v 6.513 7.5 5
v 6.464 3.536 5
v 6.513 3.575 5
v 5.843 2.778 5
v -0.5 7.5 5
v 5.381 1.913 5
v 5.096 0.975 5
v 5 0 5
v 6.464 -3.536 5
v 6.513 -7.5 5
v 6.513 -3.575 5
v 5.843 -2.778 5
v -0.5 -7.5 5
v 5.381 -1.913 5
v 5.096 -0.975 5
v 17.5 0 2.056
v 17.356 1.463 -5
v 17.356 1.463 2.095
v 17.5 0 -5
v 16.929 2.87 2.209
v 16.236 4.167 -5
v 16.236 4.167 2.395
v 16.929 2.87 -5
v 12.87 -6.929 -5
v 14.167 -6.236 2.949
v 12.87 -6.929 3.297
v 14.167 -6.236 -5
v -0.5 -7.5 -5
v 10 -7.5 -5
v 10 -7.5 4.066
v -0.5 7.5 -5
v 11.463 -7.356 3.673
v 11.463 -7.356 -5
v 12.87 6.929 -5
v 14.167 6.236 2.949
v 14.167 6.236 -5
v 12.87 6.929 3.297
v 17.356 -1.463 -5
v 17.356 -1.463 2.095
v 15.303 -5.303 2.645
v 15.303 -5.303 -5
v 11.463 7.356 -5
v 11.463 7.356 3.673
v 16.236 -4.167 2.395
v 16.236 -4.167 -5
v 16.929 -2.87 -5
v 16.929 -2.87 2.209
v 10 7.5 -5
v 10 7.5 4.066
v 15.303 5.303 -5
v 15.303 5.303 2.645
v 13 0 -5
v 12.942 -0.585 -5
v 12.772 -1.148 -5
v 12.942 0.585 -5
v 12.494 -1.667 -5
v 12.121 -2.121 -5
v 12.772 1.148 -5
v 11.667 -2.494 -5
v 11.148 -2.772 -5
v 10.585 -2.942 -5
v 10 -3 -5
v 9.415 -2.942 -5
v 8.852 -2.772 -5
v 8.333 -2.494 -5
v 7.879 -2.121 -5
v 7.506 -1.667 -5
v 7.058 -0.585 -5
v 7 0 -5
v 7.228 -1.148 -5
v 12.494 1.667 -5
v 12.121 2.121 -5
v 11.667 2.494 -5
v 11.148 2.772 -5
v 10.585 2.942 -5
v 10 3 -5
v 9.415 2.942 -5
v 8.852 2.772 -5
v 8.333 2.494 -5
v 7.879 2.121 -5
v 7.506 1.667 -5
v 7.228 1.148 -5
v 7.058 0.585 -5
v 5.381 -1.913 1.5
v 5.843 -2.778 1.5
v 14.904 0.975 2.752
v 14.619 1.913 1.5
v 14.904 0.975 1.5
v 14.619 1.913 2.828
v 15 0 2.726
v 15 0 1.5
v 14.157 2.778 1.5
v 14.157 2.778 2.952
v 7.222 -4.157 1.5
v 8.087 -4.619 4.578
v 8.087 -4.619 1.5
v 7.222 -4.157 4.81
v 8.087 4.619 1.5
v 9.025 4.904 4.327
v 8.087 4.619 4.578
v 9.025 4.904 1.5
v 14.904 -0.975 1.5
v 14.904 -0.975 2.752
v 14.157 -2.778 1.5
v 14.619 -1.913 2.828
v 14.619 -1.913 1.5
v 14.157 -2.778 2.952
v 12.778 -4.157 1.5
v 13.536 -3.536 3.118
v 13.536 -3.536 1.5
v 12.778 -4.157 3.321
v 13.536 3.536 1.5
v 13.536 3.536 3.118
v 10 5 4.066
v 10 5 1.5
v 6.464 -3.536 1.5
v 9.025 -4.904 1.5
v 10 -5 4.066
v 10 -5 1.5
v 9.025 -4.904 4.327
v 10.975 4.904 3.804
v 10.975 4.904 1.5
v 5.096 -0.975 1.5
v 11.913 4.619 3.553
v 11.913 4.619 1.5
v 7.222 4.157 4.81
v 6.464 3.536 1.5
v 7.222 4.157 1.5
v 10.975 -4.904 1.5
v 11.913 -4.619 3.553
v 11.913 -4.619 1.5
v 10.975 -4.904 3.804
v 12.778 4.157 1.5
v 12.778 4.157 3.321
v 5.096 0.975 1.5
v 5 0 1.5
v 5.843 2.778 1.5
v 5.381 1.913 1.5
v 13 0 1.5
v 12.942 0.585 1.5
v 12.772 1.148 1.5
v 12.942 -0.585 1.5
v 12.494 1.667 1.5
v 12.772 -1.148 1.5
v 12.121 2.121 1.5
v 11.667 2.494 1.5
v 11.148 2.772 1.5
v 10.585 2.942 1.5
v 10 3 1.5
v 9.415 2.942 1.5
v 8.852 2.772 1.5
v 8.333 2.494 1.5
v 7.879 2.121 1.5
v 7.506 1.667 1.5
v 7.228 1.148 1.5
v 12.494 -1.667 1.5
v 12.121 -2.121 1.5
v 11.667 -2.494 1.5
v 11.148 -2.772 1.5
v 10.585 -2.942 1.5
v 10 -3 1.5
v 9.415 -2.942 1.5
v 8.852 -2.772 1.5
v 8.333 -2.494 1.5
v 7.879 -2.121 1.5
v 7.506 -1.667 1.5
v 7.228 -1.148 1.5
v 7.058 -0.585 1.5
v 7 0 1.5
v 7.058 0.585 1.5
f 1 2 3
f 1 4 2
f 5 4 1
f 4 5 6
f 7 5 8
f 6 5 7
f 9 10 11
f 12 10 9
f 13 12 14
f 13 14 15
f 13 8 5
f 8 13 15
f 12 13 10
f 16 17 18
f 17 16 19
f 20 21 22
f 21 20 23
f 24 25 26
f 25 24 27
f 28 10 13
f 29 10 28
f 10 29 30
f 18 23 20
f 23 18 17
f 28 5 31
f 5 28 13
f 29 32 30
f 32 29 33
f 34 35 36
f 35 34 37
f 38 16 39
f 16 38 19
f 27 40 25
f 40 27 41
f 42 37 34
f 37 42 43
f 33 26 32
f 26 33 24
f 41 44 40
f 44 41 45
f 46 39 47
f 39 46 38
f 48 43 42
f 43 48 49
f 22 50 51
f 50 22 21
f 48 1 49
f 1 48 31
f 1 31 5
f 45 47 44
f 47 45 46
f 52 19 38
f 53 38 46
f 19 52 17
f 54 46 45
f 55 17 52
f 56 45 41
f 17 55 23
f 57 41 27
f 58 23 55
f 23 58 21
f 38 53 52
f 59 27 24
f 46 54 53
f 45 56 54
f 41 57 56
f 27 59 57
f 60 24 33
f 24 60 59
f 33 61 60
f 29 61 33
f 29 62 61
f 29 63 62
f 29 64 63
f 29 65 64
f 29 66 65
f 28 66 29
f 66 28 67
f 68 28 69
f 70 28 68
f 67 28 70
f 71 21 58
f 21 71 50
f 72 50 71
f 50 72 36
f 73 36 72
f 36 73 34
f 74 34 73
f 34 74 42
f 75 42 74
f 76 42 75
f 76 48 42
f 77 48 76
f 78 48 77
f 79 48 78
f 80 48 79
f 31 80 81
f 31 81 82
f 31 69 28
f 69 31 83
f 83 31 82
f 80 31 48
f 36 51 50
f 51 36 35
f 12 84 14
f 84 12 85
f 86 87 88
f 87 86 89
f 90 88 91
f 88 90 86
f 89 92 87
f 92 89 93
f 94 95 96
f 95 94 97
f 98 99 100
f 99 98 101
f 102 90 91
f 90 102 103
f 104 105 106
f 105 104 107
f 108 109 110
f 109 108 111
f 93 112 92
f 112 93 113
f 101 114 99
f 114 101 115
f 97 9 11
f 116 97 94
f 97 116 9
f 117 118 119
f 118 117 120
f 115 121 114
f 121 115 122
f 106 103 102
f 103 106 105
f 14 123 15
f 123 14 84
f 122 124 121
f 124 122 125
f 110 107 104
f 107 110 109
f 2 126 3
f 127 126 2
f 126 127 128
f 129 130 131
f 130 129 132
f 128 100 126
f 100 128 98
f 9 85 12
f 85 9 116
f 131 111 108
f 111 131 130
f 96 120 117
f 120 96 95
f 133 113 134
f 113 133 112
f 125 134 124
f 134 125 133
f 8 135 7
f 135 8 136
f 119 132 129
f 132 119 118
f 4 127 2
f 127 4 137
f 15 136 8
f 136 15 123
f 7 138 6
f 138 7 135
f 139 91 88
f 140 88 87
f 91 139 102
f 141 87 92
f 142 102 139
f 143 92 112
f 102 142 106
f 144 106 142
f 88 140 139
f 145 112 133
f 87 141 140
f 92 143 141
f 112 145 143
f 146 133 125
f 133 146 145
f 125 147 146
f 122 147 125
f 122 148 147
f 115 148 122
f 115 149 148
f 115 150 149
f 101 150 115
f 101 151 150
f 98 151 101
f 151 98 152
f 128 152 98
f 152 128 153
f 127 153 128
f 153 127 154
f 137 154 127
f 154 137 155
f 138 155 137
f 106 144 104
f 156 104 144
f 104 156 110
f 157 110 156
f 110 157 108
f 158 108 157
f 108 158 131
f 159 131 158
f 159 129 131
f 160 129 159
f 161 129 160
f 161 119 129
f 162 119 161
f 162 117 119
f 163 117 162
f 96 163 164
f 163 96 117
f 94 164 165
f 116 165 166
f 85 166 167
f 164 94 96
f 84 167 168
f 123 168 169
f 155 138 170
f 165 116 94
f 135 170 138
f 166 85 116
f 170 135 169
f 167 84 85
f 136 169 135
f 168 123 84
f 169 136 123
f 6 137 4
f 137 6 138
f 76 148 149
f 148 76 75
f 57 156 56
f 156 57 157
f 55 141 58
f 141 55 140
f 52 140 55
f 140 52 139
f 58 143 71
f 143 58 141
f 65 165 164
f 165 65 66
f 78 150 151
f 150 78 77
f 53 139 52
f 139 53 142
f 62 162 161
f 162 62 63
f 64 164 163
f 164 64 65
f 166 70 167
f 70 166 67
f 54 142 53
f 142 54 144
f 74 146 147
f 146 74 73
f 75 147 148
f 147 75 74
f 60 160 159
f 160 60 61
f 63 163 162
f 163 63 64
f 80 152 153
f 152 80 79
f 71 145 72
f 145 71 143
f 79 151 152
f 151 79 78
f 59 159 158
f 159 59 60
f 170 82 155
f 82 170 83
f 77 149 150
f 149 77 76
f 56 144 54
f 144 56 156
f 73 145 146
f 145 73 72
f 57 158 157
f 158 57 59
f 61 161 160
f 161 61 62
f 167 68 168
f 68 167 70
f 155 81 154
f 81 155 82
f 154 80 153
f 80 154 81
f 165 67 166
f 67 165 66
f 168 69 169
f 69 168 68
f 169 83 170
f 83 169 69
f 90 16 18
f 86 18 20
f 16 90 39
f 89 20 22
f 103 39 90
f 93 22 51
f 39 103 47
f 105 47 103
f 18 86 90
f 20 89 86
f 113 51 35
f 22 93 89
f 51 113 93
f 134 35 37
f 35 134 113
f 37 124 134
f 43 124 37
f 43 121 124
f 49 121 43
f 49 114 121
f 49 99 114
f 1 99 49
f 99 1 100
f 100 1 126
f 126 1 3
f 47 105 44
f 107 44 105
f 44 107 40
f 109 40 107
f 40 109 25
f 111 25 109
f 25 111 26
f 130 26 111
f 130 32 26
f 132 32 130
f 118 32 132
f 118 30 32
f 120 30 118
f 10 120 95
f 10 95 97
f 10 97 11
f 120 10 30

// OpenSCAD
thickness = 10;
hole_diameter = 6;  // Durchmesser der zusätzlichen Löcher

// Parameter für die Abschrägung
chamfer_height = 15; // Höhe der Abschrägung
chamfer_width = 35;  // Breite der Abschrägung

// Parameter für die Schraubenvertiefung
screw_diameter = 10; // Durchmesser der Schraube
screw_depth = 3.5;    // Tiefe der Vertiefung
hole_diameter = 6;  // Durchmesser der zusätzlichen Löcher

difference() {
        hull() {
            cube([1, 15, thickness], center=true);
            translate([10, 0, 0])
                cylinder(d=15, h=thickness, center=true, $fn=32);
        }
        
        // Vertiefung für die Schraube
        translate([10, 0, thickness/2 - screw_depth/2])
            cylinder(d=screw_diameter, h=screw_depth, center=true, $fn=32);
        
        // Bohrloch für die Schraube
        translate([10, 0, 0])
            cylinder(d=hole_diameter, h=thickness+2, center=true, $fn=32);
        
       // Abschrägung durch Subtraktion eines schrägen Würfels
        translate([25 - chamfer_width/2, 0, thickness/2 + chamfer_height/2])
            rotate([15, 0, 90])
                cube([chamfer_width, 25, chamfer_height], center=true);
    }
